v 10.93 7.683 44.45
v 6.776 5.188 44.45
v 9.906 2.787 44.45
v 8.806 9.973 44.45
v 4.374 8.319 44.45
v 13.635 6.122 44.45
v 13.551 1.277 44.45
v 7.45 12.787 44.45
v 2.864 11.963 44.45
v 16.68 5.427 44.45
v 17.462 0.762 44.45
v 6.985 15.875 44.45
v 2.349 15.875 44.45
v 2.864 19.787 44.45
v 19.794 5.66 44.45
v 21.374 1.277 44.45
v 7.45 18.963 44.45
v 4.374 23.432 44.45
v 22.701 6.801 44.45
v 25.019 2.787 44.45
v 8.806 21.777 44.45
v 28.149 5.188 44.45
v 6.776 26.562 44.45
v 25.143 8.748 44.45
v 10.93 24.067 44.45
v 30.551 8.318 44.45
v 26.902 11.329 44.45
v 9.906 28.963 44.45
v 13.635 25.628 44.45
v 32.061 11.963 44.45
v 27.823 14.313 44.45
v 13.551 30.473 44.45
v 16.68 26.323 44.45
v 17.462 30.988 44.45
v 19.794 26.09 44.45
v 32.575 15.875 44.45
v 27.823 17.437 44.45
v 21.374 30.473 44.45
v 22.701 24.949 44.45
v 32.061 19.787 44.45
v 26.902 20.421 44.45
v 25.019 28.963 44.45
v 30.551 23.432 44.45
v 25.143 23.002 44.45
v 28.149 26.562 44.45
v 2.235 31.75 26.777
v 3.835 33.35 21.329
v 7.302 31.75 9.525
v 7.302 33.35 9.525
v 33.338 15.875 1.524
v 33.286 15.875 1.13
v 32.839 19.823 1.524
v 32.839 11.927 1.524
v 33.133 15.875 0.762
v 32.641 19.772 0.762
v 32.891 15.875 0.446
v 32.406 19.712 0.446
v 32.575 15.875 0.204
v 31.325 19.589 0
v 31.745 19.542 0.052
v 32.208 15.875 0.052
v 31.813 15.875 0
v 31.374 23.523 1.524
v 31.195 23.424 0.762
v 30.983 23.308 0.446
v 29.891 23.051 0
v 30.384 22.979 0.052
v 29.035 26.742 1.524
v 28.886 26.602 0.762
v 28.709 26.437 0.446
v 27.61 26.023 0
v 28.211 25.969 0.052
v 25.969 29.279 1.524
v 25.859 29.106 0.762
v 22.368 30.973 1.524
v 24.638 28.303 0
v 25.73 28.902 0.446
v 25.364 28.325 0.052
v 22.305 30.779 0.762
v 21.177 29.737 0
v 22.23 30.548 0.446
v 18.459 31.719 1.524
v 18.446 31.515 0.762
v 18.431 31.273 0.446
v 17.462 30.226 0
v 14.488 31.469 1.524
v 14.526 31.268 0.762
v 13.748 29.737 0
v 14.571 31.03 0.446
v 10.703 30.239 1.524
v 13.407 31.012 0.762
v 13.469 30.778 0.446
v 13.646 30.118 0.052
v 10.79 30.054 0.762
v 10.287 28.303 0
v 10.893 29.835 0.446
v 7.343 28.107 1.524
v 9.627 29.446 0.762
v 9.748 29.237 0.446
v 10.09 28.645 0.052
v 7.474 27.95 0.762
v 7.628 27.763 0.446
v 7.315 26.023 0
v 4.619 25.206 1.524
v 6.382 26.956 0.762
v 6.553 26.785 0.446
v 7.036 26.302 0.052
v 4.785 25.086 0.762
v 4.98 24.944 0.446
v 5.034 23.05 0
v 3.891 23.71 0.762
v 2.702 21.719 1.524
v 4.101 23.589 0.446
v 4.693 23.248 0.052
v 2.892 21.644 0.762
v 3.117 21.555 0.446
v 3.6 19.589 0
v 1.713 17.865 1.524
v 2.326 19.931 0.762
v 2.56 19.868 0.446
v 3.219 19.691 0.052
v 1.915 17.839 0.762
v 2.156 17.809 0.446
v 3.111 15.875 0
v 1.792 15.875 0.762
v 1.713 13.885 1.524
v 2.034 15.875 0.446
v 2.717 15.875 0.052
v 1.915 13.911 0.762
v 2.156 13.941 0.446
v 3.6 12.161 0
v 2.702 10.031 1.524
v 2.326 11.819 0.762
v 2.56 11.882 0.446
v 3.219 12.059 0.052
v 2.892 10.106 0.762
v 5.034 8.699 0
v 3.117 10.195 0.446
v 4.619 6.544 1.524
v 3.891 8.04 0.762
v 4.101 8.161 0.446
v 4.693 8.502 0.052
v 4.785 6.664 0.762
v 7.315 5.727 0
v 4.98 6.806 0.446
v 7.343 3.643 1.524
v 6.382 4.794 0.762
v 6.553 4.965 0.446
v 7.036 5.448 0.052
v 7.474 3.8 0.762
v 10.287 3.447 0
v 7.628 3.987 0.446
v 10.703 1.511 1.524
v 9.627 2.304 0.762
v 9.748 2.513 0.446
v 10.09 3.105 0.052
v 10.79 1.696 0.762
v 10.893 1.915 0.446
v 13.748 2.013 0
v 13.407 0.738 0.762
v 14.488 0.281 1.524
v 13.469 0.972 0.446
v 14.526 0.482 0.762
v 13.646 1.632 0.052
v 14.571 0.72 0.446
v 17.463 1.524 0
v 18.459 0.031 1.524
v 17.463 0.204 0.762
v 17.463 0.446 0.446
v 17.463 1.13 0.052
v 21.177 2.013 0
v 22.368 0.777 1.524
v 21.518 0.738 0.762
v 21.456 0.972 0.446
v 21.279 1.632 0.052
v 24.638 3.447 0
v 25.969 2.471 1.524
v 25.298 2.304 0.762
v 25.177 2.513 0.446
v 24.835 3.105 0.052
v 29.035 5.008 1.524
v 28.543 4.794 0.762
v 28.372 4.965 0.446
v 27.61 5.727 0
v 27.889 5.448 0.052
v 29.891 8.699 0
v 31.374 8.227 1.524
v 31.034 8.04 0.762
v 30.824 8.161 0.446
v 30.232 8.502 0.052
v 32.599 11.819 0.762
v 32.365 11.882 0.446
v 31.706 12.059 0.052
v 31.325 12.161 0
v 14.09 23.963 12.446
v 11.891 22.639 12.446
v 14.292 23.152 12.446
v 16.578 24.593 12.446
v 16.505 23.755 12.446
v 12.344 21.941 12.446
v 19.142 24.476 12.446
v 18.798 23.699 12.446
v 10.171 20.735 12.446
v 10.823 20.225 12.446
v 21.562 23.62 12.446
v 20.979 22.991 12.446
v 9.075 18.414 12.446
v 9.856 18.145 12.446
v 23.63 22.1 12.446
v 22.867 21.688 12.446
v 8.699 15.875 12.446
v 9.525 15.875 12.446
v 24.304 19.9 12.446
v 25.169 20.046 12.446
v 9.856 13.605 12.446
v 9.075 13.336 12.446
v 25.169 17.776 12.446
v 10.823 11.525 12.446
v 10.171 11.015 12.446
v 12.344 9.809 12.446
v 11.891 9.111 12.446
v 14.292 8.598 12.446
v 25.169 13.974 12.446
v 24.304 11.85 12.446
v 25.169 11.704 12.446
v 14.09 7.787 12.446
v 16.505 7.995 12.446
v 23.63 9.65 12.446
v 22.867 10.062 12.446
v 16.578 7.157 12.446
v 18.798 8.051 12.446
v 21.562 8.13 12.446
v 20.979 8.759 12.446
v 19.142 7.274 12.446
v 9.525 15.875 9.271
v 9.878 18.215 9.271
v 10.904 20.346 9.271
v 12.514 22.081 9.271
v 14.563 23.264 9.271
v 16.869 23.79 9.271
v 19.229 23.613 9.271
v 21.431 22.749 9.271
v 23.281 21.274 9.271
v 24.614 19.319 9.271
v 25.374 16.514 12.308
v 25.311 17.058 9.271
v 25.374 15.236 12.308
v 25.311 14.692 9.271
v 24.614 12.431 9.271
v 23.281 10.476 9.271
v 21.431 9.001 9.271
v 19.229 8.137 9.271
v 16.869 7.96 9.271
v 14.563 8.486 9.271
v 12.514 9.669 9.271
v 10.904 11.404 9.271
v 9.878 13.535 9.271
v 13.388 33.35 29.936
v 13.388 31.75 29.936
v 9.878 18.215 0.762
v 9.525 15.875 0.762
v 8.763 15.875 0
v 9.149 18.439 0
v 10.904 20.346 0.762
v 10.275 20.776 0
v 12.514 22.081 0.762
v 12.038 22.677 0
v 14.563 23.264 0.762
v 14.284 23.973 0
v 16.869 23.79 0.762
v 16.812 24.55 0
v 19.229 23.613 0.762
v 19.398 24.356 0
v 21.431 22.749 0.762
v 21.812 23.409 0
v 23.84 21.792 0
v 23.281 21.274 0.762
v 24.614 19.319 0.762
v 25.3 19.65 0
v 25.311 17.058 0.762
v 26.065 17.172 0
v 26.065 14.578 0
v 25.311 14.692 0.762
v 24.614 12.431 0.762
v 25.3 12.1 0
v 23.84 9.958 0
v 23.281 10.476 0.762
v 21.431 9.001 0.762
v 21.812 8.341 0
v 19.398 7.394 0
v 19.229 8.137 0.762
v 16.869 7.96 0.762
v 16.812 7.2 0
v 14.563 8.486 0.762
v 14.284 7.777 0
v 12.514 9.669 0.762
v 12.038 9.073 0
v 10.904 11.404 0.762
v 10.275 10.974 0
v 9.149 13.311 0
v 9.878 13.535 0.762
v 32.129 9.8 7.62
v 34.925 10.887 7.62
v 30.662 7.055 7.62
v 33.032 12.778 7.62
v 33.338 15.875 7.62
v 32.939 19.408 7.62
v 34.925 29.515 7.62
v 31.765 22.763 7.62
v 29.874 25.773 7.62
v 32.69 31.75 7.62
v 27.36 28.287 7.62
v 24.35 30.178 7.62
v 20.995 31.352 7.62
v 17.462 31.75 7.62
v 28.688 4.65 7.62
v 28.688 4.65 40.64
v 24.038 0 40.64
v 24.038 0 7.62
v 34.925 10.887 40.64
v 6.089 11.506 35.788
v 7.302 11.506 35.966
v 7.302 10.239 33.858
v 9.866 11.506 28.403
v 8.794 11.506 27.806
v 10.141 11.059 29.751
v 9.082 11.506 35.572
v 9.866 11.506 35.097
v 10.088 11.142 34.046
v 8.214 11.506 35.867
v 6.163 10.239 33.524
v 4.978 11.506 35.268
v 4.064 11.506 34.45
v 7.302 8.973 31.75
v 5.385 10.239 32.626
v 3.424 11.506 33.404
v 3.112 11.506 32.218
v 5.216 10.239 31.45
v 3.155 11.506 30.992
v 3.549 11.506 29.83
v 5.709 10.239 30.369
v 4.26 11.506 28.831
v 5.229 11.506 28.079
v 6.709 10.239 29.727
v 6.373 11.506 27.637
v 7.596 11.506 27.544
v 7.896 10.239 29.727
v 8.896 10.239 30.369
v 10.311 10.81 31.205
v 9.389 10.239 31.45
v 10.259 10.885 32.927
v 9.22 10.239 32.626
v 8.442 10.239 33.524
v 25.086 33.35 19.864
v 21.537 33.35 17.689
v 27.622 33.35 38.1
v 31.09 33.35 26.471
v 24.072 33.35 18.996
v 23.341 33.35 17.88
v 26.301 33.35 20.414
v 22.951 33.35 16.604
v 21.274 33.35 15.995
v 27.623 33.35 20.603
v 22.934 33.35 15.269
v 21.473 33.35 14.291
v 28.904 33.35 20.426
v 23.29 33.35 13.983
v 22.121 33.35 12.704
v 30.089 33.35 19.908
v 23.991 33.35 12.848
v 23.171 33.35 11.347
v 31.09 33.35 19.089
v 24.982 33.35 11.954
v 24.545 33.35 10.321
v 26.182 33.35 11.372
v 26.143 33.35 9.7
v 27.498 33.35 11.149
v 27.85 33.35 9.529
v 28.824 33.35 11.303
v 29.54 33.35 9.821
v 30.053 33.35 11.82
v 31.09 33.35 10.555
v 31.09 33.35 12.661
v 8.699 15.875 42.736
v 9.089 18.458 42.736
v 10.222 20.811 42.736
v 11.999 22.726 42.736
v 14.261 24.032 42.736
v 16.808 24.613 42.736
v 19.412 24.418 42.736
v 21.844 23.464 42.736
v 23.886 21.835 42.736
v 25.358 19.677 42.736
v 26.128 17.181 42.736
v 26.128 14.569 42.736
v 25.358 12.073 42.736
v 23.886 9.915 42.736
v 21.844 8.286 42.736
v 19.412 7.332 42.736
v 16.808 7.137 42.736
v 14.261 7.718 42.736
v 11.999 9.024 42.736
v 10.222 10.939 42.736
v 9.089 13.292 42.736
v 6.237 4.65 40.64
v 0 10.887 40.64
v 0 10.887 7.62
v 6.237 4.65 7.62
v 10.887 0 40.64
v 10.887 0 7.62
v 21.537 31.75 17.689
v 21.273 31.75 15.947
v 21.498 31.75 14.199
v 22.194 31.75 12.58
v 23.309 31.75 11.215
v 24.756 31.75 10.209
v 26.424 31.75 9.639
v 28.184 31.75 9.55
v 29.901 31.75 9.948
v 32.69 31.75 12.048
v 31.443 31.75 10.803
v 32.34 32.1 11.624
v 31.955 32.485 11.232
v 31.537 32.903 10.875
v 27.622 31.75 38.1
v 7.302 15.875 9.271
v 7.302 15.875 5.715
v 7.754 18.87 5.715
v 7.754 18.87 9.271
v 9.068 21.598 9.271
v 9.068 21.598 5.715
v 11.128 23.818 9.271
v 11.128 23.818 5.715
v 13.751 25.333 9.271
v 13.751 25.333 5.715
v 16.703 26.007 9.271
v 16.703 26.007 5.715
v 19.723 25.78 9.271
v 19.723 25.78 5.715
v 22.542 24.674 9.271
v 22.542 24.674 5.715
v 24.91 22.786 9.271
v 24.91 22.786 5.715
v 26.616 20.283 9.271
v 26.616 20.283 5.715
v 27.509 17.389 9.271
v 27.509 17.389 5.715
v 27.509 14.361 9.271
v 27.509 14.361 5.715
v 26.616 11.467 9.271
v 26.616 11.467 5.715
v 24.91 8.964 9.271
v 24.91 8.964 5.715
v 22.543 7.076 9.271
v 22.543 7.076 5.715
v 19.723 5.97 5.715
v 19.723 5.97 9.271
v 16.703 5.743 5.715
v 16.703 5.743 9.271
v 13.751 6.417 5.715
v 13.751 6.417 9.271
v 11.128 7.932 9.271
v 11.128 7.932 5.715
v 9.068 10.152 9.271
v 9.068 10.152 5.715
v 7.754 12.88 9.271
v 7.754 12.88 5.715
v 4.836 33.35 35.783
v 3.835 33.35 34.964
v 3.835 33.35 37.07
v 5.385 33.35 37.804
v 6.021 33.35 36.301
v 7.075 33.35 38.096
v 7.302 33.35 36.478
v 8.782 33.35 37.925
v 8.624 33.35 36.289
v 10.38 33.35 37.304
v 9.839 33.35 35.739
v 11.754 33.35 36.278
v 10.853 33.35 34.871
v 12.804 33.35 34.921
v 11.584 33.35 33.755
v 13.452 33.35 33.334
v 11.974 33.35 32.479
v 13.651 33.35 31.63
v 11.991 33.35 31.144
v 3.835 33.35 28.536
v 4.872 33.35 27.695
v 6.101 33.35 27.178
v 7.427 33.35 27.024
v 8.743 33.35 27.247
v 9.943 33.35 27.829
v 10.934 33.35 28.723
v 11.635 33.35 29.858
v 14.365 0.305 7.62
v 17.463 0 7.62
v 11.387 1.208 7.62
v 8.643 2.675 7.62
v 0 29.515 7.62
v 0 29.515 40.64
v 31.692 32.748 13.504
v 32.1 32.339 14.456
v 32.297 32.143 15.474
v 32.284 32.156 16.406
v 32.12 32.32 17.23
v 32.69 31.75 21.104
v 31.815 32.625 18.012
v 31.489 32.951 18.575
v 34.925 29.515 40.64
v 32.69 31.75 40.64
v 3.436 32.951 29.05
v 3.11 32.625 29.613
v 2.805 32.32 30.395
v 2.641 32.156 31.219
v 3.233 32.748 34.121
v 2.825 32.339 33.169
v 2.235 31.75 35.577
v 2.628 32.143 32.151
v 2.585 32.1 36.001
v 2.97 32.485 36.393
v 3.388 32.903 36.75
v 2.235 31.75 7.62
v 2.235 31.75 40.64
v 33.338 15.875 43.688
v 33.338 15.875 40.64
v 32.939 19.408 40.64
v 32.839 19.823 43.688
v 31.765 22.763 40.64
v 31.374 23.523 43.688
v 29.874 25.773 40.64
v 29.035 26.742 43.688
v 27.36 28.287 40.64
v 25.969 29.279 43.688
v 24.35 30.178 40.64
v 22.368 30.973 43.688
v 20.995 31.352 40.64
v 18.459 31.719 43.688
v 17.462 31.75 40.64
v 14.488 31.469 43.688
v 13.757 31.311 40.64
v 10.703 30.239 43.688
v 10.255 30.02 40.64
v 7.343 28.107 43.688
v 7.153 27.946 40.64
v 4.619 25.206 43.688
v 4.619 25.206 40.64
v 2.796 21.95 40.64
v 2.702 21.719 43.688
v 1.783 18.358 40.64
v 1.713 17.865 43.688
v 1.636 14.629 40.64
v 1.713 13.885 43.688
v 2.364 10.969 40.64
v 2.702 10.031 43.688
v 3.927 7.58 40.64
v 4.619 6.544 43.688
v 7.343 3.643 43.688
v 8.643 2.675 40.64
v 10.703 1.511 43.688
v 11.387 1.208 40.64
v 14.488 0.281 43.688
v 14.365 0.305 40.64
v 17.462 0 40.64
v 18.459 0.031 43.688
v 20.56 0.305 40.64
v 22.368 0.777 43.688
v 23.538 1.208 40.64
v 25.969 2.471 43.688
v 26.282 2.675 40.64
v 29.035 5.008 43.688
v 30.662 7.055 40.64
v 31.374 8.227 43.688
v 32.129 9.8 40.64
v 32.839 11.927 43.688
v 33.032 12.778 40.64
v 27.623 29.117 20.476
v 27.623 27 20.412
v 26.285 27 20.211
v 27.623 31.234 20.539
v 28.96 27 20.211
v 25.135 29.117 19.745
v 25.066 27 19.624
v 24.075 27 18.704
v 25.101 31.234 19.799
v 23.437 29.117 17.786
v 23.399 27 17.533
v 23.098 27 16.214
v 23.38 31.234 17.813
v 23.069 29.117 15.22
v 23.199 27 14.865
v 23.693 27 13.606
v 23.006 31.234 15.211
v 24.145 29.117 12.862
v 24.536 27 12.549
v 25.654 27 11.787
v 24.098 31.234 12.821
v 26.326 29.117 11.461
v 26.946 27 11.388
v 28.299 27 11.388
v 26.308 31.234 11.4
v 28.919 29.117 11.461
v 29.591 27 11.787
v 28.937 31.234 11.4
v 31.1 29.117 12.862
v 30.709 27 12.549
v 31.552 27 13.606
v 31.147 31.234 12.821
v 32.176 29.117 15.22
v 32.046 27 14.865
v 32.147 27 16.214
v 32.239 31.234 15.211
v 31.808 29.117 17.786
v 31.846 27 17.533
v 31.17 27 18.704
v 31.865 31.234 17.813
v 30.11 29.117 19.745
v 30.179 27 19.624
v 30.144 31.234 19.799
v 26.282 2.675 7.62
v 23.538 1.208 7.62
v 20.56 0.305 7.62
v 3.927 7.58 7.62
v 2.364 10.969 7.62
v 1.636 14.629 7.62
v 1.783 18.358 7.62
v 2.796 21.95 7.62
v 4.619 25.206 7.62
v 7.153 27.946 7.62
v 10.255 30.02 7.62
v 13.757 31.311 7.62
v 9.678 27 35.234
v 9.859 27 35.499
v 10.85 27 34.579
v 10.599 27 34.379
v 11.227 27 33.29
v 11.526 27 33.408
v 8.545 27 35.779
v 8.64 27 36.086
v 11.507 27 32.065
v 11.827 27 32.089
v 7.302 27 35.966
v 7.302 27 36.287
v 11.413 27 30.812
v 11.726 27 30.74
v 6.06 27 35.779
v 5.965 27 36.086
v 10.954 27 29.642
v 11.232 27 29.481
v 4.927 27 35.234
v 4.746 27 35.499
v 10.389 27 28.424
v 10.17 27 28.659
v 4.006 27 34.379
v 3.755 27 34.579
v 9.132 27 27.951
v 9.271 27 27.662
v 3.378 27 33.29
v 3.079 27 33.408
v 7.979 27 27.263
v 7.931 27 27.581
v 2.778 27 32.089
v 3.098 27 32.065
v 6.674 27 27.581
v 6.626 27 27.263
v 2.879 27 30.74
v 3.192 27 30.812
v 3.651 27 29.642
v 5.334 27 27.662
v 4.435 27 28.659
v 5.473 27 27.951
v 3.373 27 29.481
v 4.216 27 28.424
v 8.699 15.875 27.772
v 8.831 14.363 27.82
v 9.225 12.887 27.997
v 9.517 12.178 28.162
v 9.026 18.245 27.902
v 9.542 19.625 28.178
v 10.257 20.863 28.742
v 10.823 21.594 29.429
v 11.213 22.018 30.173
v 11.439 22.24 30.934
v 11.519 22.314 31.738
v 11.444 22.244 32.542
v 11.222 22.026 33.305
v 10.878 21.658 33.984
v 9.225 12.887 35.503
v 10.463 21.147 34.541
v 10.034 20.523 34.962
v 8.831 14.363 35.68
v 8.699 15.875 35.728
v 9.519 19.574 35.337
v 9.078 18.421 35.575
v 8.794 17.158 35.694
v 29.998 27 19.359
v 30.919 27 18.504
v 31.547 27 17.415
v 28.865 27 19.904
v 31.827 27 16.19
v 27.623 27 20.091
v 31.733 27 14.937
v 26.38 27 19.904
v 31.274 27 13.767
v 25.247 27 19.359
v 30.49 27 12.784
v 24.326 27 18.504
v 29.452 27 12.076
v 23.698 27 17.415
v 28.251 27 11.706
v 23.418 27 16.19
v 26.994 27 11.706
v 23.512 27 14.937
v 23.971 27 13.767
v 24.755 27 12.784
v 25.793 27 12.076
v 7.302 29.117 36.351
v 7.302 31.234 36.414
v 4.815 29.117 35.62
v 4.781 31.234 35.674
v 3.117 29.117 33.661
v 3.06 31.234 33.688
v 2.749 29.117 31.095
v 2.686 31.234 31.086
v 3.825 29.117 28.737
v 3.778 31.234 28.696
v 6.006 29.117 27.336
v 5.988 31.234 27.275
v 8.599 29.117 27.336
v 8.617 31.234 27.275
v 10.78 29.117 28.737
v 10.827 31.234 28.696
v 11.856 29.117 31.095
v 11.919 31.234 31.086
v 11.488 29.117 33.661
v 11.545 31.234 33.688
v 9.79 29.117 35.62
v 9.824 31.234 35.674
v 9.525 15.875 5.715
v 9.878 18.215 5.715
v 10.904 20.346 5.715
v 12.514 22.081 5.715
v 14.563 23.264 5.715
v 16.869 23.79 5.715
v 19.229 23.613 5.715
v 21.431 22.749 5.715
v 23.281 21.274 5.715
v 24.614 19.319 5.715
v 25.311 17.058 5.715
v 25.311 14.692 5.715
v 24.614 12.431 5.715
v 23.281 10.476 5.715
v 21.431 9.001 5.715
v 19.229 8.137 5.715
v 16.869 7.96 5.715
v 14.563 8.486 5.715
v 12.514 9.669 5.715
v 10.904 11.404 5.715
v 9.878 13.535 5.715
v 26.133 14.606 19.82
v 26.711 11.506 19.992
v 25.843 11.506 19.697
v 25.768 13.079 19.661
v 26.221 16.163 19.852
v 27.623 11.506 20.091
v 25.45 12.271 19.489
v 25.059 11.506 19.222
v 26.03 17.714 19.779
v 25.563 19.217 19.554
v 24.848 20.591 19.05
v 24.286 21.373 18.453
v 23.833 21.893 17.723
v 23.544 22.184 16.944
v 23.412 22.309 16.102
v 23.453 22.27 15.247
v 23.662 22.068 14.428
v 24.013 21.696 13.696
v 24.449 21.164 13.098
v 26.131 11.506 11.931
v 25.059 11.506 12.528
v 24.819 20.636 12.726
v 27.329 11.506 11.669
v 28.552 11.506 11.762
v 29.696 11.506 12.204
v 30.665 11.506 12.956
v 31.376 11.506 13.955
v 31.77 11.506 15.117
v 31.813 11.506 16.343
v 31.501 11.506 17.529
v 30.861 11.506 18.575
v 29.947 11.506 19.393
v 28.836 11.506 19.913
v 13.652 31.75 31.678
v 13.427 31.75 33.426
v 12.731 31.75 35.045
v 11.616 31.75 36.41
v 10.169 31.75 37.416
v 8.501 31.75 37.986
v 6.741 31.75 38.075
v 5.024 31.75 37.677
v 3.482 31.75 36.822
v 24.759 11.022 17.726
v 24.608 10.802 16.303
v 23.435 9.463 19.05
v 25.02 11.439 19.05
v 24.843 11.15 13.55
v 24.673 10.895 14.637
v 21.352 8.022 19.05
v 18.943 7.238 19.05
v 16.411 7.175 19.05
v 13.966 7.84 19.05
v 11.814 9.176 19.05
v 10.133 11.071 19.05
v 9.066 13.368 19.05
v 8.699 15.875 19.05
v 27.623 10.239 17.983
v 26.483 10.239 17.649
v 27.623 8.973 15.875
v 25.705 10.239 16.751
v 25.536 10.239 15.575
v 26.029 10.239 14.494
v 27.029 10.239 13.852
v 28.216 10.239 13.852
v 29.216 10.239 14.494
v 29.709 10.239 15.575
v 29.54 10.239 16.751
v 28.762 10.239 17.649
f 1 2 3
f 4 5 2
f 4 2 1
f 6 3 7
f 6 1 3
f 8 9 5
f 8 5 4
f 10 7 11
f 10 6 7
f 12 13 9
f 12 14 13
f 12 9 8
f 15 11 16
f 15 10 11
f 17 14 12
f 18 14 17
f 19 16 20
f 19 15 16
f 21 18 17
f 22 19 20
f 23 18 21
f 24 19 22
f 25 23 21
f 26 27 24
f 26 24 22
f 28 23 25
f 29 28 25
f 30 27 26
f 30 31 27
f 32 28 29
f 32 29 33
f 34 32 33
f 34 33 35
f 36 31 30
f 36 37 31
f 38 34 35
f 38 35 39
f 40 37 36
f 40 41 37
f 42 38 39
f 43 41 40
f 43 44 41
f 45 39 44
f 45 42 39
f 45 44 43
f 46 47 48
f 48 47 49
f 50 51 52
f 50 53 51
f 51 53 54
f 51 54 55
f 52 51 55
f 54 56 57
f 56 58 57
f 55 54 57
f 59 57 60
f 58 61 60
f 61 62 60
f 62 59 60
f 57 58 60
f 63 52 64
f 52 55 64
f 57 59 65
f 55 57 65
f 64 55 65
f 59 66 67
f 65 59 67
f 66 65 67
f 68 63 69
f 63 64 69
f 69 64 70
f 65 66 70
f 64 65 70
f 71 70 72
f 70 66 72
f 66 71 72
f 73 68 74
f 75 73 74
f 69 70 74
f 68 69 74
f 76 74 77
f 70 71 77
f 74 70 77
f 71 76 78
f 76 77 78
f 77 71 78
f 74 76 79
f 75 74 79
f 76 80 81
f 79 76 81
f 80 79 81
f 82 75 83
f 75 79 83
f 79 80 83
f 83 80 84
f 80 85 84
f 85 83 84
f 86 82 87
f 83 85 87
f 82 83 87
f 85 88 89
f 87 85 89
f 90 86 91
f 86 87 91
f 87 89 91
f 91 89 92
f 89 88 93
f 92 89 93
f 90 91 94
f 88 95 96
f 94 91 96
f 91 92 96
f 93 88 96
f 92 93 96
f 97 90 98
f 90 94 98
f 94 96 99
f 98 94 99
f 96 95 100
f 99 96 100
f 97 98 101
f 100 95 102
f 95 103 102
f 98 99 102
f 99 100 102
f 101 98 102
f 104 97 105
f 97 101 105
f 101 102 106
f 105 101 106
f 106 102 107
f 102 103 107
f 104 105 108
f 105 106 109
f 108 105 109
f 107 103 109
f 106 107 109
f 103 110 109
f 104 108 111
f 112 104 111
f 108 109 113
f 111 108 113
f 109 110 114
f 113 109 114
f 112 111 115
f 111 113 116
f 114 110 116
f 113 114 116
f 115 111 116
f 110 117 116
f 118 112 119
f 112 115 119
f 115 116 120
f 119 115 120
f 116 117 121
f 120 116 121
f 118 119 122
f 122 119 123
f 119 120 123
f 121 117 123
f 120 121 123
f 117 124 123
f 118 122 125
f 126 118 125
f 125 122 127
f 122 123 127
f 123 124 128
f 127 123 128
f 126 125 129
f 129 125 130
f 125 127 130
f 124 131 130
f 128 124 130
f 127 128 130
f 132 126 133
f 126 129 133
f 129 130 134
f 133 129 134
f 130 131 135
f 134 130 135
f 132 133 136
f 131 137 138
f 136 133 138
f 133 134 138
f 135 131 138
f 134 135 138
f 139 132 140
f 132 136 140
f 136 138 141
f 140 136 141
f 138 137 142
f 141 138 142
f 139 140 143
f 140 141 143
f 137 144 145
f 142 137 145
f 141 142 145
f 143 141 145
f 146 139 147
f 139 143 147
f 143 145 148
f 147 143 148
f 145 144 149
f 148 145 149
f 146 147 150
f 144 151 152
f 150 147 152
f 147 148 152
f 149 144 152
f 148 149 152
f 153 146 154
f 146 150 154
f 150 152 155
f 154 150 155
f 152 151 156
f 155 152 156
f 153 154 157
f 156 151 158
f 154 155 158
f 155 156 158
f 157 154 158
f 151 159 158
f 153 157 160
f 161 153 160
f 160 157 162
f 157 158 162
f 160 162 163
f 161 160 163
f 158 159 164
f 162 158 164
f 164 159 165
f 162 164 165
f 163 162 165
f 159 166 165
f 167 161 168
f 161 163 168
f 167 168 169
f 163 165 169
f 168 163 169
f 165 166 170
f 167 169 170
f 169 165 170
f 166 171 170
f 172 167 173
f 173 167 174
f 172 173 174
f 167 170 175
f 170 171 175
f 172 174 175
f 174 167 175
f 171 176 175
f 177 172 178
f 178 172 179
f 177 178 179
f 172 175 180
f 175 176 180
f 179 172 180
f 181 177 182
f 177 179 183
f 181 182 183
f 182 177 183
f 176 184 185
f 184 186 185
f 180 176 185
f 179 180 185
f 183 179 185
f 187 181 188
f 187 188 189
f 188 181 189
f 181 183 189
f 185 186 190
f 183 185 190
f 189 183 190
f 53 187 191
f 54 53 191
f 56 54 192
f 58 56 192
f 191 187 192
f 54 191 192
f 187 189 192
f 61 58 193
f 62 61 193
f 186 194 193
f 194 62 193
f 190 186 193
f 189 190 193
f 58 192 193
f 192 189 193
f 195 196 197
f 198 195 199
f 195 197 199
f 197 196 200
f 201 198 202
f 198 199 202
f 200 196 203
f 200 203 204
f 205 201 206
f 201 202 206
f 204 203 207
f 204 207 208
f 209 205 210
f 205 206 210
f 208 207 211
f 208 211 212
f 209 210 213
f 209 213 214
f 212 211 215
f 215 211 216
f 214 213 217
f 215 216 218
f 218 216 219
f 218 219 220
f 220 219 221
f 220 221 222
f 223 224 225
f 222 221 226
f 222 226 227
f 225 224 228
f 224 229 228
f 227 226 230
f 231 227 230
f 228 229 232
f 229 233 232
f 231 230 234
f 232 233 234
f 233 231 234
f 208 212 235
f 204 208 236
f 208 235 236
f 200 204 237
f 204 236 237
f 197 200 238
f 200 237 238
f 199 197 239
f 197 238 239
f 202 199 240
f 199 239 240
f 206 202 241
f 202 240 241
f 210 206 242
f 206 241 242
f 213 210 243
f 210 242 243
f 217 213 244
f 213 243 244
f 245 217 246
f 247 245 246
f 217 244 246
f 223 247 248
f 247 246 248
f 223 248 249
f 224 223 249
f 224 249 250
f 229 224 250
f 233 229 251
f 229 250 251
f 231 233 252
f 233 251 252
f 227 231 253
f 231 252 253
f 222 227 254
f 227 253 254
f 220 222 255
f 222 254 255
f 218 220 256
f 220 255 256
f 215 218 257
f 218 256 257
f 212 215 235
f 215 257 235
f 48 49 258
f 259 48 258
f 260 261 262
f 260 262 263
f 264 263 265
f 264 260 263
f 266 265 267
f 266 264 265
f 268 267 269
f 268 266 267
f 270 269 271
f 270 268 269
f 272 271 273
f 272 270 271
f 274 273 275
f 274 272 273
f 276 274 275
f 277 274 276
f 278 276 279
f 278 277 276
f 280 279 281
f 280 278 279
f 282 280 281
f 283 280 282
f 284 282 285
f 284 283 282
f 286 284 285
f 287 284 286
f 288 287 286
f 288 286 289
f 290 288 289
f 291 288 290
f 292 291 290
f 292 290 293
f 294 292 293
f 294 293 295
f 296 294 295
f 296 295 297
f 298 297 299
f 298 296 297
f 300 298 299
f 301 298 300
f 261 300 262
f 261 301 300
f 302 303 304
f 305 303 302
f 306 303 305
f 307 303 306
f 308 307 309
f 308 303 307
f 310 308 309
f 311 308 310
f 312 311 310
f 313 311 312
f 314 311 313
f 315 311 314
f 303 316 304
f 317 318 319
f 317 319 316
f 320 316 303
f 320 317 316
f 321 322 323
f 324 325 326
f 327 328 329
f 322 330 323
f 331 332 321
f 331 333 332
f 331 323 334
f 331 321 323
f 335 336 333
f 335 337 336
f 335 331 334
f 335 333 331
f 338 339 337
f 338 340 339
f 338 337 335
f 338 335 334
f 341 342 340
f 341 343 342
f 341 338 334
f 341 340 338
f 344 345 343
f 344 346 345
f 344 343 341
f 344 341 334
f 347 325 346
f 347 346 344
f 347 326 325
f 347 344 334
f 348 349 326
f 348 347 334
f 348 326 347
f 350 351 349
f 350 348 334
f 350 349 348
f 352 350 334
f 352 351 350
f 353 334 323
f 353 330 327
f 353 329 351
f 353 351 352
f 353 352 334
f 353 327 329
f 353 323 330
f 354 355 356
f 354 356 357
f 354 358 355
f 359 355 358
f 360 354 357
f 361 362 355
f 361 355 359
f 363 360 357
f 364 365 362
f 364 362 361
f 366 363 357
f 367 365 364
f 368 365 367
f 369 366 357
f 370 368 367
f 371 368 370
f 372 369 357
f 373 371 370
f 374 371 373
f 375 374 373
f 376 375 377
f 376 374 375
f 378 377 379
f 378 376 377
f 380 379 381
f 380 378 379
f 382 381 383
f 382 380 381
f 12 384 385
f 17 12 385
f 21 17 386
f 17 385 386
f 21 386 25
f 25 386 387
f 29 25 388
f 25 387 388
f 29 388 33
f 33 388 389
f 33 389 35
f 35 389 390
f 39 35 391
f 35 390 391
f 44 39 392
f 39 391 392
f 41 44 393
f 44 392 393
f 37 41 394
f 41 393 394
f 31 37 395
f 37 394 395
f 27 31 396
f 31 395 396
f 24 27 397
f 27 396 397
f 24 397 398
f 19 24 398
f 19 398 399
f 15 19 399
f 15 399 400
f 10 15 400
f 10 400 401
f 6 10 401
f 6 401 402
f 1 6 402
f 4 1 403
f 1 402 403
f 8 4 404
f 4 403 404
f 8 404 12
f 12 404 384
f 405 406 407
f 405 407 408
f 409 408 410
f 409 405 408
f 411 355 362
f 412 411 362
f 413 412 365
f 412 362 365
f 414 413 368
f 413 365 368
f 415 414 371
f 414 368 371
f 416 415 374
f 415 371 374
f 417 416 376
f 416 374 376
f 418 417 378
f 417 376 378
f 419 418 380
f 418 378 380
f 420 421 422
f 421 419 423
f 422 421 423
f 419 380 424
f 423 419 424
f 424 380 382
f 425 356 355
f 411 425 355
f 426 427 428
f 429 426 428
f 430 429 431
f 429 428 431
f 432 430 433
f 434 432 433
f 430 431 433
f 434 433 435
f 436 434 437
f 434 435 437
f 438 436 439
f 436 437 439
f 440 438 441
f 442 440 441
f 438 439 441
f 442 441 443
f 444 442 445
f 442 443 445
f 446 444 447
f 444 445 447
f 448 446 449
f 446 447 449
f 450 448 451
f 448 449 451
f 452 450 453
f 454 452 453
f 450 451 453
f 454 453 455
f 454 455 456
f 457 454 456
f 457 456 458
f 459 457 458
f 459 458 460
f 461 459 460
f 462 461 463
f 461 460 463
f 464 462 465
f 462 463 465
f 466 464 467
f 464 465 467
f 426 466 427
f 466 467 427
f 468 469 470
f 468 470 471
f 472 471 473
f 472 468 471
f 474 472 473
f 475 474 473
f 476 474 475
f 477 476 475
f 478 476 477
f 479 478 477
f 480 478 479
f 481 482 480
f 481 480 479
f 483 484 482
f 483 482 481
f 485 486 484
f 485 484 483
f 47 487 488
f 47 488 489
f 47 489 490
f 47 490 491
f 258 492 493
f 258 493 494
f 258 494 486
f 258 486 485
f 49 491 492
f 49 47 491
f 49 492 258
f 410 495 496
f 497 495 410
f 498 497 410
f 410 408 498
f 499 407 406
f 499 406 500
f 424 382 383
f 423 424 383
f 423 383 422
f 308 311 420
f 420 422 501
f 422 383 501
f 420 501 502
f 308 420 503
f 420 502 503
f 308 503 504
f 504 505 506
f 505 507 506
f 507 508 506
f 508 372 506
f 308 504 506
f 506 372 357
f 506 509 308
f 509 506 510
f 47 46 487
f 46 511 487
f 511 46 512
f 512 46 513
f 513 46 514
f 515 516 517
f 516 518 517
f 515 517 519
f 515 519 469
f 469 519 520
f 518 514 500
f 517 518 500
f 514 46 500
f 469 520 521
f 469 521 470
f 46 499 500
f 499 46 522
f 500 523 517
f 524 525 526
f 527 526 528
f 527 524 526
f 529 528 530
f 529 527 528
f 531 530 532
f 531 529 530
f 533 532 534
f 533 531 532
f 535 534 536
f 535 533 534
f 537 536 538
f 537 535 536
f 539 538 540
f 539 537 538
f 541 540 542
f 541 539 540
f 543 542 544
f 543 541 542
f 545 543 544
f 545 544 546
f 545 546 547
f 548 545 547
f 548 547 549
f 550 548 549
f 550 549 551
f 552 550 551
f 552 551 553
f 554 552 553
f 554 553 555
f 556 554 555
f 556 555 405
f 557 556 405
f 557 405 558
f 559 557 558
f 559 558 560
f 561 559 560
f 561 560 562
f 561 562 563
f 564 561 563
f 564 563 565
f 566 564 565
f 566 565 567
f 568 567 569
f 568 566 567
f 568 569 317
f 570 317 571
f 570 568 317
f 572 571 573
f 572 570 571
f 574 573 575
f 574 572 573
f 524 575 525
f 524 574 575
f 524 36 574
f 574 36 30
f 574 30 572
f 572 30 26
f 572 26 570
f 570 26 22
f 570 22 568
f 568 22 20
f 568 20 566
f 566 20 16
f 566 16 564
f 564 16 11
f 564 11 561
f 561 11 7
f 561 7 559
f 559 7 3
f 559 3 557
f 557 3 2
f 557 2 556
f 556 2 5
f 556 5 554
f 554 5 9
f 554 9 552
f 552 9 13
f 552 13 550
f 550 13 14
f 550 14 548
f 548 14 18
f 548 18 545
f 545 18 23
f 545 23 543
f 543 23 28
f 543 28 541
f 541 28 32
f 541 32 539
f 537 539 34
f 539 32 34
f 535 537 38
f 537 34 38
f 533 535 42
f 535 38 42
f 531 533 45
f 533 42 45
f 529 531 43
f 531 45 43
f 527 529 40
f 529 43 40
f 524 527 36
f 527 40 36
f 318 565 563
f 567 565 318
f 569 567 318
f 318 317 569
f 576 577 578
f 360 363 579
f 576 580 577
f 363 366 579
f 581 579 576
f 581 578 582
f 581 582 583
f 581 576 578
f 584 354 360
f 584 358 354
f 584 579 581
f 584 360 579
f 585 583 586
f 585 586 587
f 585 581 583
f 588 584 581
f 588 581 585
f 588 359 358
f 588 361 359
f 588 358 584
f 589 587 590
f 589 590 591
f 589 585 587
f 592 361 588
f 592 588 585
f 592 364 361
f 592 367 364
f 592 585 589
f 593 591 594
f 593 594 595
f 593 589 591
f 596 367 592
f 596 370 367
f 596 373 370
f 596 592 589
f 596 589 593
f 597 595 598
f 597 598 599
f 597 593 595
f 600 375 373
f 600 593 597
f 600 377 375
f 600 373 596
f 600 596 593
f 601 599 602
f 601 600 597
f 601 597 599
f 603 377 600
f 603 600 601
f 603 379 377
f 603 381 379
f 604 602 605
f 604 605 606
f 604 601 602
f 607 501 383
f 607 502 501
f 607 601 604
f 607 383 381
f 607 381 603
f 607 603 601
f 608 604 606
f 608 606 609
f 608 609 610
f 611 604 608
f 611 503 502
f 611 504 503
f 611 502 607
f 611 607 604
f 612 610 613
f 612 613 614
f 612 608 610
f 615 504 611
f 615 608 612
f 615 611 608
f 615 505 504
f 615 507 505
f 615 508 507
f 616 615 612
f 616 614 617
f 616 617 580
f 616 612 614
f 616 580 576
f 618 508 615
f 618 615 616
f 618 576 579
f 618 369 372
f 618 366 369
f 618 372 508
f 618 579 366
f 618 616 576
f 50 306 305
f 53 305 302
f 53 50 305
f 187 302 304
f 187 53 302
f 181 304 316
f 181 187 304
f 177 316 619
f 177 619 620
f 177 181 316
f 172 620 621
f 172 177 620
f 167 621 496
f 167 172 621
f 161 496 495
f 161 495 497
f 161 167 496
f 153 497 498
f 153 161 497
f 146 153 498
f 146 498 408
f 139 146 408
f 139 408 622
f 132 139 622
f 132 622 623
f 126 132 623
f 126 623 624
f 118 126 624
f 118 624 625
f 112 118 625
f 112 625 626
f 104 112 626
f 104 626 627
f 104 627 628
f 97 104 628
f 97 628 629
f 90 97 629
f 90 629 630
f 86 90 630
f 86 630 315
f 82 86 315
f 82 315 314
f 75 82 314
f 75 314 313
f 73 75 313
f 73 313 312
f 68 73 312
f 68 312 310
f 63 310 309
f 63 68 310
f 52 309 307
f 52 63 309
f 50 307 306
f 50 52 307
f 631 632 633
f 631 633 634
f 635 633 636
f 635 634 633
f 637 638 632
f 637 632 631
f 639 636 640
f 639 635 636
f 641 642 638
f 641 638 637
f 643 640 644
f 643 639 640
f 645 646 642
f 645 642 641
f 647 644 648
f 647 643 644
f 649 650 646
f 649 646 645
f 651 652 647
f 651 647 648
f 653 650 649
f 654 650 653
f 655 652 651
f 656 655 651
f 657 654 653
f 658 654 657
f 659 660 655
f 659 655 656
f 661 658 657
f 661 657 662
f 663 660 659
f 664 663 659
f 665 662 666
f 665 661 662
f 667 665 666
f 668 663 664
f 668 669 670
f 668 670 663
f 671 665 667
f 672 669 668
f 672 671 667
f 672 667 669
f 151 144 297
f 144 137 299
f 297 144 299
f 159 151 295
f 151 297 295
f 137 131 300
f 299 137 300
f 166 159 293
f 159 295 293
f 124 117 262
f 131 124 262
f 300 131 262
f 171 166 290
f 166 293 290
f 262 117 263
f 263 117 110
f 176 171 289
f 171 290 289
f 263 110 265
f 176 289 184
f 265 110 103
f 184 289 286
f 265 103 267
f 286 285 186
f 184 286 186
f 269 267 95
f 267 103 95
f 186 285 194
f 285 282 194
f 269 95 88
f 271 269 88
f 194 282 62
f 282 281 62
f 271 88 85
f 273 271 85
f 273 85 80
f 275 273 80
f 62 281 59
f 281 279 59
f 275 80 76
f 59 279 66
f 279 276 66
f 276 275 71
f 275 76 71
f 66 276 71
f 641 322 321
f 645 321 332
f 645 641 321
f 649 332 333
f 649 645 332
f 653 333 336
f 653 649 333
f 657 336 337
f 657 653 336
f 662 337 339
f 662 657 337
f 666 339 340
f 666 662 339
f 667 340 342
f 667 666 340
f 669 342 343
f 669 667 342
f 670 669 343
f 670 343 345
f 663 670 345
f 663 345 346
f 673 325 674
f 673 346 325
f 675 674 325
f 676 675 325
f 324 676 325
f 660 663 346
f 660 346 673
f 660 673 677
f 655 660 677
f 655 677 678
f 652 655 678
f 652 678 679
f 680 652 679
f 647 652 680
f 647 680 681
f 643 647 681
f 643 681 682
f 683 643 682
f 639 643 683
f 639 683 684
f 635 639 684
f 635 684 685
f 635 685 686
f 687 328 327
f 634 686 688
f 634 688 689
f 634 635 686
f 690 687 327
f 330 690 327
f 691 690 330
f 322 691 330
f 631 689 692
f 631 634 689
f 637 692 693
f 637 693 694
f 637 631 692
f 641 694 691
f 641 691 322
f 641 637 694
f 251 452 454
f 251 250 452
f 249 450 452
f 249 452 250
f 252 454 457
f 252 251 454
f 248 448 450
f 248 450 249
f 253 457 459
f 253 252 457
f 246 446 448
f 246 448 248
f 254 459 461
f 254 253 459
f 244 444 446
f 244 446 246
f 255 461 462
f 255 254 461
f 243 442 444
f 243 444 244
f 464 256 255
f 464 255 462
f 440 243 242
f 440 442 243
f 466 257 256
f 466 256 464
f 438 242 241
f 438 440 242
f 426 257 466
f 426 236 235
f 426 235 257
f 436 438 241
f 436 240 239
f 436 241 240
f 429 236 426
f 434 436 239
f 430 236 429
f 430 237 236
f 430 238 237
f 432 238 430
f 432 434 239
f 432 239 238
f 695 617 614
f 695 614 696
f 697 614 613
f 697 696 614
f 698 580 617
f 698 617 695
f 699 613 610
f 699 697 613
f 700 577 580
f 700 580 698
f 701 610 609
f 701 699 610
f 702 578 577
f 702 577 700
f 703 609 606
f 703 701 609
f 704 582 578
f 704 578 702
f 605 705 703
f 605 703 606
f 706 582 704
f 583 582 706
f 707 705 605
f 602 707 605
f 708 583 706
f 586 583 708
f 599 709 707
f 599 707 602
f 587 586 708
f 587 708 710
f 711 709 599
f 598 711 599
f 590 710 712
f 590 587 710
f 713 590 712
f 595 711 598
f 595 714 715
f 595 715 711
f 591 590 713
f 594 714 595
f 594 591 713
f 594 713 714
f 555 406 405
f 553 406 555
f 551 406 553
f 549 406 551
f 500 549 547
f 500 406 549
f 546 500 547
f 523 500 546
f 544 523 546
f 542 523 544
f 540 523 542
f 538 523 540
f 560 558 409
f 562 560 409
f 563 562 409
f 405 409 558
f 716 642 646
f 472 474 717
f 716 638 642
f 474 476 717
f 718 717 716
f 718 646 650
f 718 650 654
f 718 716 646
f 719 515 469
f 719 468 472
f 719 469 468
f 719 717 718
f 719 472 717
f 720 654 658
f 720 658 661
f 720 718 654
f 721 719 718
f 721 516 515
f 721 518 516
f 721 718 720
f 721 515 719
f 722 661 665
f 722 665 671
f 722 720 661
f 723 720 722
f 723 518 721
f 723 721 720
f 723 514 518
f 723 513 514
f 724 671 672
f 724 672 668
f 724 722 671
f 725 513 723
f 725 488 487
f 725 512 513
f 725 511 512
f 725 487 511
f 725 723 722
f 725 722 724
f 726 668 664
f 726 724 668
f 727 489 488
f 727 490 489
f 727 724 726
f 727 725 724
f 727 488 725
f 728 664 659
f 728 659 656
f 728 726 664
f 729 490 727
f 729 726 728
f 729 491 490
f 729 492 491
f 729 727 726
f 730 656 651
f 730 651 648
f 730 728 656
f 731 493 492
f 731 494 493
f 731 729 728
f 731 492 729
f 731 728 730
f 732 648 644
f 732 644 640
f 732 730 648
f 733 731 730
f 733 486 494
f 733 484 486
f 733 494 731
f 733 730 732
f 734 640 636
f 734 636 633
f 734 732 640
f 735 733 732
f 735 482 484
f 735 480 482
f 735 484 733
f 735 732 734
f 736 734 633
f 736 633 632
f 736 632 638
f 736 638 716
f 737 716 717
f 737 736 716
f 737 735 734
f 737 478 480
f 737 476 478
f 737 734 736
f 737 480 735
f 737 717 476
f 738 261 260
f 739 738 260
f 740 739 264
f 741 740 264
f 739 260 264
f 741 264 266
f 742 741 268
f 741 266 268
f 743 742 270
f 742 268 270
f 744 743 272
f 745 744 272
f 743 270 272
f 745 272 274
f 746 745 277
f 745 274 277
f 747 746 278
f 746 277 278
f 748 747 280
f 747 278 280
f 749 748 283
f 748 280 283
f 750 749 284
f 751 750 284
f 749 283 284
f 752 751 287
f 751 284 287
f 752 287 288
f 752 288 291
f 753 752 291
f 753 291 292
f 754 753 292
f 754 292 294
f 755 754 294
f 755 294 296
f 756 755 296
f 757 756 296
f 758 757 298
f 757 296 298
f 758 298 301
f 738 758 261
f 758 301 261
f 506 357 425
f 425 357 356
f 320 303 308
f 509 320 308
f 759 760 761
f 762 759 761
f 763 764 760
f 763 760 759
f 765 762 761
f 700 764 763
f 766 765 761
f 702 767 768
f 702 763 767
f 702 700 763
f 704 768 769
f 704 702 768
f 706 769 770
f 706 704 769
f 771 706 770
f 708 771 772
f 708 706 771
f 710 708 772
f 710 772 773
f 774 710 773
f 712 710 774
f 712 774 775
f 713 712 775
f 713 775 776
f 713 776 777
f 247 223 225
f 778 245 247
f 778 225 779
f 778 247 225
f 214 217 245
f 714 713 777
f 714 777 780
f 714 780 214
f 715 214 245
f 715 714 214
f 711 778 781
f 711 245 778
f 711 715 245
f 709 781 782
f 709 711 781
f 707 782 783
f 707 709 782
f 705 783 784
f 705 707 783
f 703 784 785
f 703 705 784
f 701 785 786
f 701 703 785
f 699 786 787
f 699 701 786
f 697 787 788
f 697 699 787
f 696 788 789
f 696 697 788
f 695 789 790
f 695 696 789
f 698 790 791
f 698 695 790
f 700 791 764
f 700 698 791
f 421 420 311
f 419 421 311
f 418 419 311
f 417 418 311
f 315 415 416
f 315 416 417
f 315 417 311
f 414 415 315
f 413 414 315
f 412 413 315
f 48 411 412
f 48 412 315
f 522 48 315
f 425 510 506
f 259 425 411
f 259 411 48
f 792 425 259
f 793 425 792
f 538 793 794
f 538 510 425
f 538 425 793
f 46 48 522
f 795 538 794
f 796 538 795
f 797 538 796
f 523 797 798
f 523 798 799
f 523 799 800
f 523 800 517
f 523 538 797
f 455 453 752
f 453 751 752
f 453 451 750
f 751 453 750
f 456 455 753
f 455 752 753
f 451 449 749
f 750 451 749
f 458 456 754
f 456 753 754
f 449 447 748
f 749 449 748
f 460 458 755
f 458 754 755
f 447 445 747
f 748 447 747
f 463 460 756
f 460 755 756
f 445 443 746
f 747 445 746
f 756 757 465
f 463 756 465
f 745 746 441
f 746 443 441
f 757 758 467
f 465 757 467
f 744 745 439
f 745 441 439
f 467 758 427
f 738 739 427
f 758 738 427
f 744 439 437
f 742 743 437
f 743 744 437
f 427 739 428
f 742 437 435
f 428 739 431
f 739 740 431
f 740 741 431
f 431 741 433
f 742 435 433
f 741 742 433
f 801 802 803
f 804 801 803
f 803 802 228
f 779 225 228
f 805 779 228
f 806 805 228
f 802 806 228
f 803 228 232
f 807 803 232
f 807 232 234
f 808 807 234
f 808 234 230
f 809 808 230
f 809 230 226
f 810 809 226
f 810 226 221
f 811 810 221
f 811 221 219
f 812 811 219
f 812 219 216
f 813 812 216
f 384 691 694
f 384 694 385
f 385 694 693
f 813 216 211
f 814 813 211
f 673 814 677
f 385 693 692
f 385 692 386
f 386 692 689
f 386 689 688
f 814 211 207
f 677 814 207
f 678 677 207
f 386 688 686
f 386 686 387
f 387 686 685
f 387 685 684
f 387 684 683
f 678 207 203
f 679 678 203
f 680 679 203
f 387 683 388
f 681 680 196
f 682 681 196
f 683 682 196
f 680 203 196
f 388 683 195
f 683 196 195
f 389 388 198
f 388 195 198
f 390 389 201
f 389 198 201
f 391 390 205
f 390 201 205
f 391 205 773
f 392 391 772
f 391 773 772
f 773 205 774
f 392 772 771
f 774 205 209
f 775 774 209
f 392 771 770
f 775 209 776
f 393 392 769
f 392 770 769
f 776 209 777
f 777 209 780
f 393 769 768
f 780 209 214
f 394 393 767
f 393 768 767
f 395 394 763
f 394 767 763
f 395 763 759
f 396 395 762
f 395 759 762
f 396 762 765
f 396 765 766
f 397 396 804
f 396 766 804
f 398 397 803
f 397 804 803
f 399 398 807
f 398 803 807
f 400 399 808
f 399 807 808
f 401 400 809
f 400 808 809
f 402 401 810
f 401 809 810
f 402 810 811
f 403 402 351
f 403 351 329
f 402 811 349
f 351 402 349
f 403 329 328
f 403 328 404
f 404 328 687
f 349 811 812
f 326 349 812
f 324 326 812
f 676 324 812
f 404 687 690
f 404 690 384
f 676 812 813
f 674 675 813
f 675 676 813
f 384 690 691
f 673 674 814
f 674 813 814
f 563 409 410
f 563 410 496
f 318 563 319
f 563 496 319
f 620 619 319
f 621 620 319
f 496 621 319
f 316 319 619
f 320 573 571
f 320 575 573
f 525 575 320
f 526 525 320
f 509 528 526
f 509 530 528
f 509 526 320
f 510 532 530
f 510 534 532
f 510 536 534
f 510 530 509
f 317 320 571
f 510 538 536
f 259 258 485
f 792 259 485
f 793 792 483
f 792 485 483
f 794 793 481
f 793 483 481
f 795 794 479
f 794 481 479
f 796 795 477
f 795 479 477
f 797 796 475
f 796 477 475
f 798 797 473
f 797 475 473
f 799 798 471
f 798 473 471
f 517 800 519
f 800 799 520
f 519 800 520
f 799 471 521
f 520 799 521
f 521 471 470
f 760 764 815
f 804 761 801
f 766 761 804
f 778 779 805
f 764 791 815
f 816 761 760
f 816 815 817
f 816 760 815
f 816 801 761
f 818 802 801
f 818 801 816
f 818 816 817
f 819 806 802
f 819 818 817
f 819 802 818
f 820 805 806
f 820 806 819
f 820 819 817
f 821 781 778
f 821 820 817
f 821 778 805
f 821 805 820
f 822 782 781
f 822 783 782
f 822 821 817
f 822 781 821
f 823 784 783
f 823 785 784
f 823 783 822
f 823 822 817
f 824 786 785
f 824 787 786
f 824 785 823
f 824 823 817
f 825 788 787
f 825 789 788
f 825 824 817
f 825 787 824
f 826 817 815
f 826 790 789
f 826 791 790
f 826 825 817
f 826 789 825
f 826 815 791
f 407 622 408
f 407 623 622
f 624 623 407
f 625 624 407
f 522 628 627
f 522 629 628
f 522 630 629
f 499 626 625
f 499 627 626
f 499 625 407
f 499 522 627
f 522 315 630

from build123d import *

# Parameters (mm, degrees)
SKETCH1_W                         = 34.925
SKETCH1_H                         = 33.3502
EXTRUDE1_DEPTH                    = 44.45
CUT_EXTRUDE1_DEPTH                = 44.45
SKETCH3_OUTSIDE_W                 = 50.051
SKETCH3_OUTSIDE_H                 = 48.476
SKETCH3_OUTSIDE_R                 = 15.875
CUT_EXTRUDE2_DEPTH                = 3.81
F_1_8_NPT_TAPPED_HOLE1_AT_2_COUNT = 2
F_1_8_NPT_TAPPED_HOLE1_AT_2_PITCH = 25.78600444
SKETCH5_OUTSIDE_W                 = 50.051
SKETCH5_OUTSIDE_H                 = 48.476
SKETCH5_OUTSIDE_R                 = 15.875
CUT_EXTRUDE3_DEPTH                = 7.62
SKETCH6_W                         = 34.925
SKETCH6_H                         = 33.02
CUT_EXTRUDE4_DEPTH                = 1.6002
CUT_EXTRUDE5_DEPTH                = 45.45
F_5_8_0_625_DIAMETER_HOLE1_D      = 15.875
F_3_4_16_TAPPED_HOLE1_D           = 17.526
F_3_4_16_TAPPED_HOLE1_DEPTH       = 25.4
F_3_4_16_TAPPED_HOLE1_TIP         = 5.265341605
SKETCH16_R                        = 10.16
CUT_EXTRUDE7_DEPTH                = 3.556
CHAMFER1_SIZE                     = 0.762
FILLET1_R                         = 1.524
CHAMFER2_SIZE                     = 1.7145
SKETCH18_R                        = 8.763
CUT_EXTRUDE9_DEPTH                = 7.62


with BuildPart() as part:
    # Sketch1 → Extrude1 (new body)
    with BuildSketch(Plane.XY):
        with Locations((17.4625, 16.6751)):
            Rectangle(SKETCH1_W, SKETCH1_H)
    extrude(amount=EXTRUDE1_DEPTH)

    # Sketch2 → Cut-Extrude1 (cut)
    with BuildSketch(Plane.XY.offset(44.45)):
        Polygon((24.038140303, 0), (34.925, 10.886859697), (38.95323648, 7.676224118), (37.650767603, -4.874839611), (-1.660111248, -5.999699096), (-2.784970733, 8.327458557), (0, 10.886859697), (10.886859697, 0), (18.528156354, -3.690776995), align=None)
    extrude(amount=-CUT_EXTRUDE1_DEPTH, mode=Mode.SUBTRACT)

    # Sketch3 outside → Cut-Extrude2 (cut)
    with BuildSketch(Plane.XY.offset(44.45)):
        with Locations((17.4625, 16.675)):
            Rectangle(SKETCH3_OUTSIDE_W, SKETCH3_OUTSIDE_H)
        with Locations((17.4625, 15.875)):
            Circle(SKETCH3_OUTSIDE_R, mode=Mode.SUBTRACT)
    extrude(amount=-CUT_EXTRUDE2_DEPTH, mode=Mode.SUBTRACT)

    # Sketch4 → 1/8 NPT Tapped Hole1 (revolve, cut)
    with BuildSketch(Plane(origin=(7.3025, 33.3502, 31.75), x_dir=(0, 0, 1), z_dir=(1, 0, 0))):
        Polygon((0, 0), (0, 24.377468714), (4.2164, 21.844), (4.2164, 6.35), (4.537409396, 6.35), (4.7275369, 0), align=None)
    f_1_8_npt_tapped_hole1 = revolve(axis=Axis((7.3025, 39.7002, 31.75), (0, -1, 0)), mode=Mode.SUBTRACT)

    # 1/8 NPT Tapped Hole1 at 2: 1/8 NPT Tapped Hole1 ×2
    with Locations(*[Vector(0.788024374, 0, -0.615644042) * (i * F_1_8_NPT_TAPPED_HOLE1_AT_2_PITCH) for i in range(1, F_1_8_NPT_TAPPED_HOLE1_AT_2_COUNT)]):
        add(f_1_8_npt_tapped_hole1, mode=Mode.SUBTRACT)

    # Sketch5 outside → Cut-Extrude3 (cut)
    with BuildSketch(Plane(origin=(0, 0, 0), x_dir=(-1, 0, 0), z_dir=(0, 0, -1))):
        with Locations((-17.4625, 16.675)):
            Rectangle(SKETCH5_OUTSIDE_W, SKETCH5_OUTSIDE_H)
        with Locations(Location((-17.4625, 15.875, 0), (0, 0, 180))):  # turned: the seam where the file's is
            Circle(SKETCH5_OUTSIDE_R, mode=Mode.SUBTRACT)
    extrude(amount=-CUT_EXTRUDE3_DEPTH, mode=Mode.SUBTRACT)

    # Sketch6 → Cut-Extrude4 (cut)
    with BuildSketch(Plane(origin=(0, 33.3502, 0), x_dir=(-1, 0, 0), z_dir=(0, 1, 0))):
        with Locations((-17.4625, 24.13)):
            Rectangle(SKETCH6_W, SKETCH6_H)
        with BuildLine():
            Line((-33.707799282, 17.689285714), (-27.6225, 38.1))
            Line((-27.6225, 38.1), (-21.537200718, 17.689285714))
            ThreePointArc((-21.537200718, 17.689285714), (-27.6225, 9.525), (-33.707799282, 17.689285714))
        make_face(mode=Mode.SUBTRACT)
        with BuildLine():
            Line((-7.3025, 9.525), (-13.387799282, 29.935714286))
            ThreePointArc((-13.387799282, 29.935714286), (-7.839432762, 38.077258744), (-0.998497845, 30.98707351))
            ThreePointArc((-0.998497845, 30.98707351), (-1.209886072, 29.96043147), (-1.587281519, 28.982550324))
            Line((-1.587281519, 28.982550324), (-7.3025, 9.525))
        make_face(mode=Mode.SUBTRACT)
    extrude(amount=-CUT_EXTRUDE4_DEPTH, mode=Mode.SUBTRACT)

    # Sketch8 → Cut-Extrude5 (cut, through all)
    with BuildSketch(Plane.XY.offset(44.45)):
        Polygon((0, 29.5148), (8.827956785, 38.342756785), (29.988545511, 34.451254489), (34.925, 29.5148), (37.769173864, 38.094844764), (-2.725767603, 41.455222953), (-4.620267788, 29.436987401), align=None)
    extrude(amount=-CUT_EXTRUDE5_DEPTH, mode=Mode.SUBTRACT)

    # 5/8 (0.625) Diameter Hole1 (through all)
    with Locations(Plane(origin=(17.4625, 15.875, 44.45), x_dir=(1, 0, 0), z_dir=(0, 0, 1))):
        with Locations((0, 0)):
            Hole(F_5_8_0_625_DIAMETER_HOLE1_D / 2)

    # 3/4-16 Tapped Hole1
    with Locations(Plane(origin=(17.4625, 15.875, 44.45), x_dir=(1, 0, 0), z_dir=(0, 0, 1))):
        with Locations((0, 0)):
            Hole(F_3_4_16_TAPPED_HOLE1_D / 2, depth=F_3_4_16_TAPPED_HOLE1_DEPTH)
            with Locations((0, 0, -(F_3_4_16_TAPPED_HOLE1_DEPTH + F_3_4_16_TAPPED_HOLE1_TIP / 2))):  # 118° drill point
                Cone(0, F_3_4_16_TAPPED_HOLE1_D / 2, F_3_4_16_TAPPED_HOLE1_TIP, mode=Mode.SUBTRACT)

    # Sketch16 → Cut-Extrude7 (cut)
    with BuildSketch(Plane(origin=(0, 0, 5.715), x_dir=(-1, 0, 0), z_dir=(0, 0, -1))):
        with Locations((-17.4625, 15.875)):
            Circle(SKETCH16_R)
    extrude(amount=-CUT_EXTRUDE7_DEPTH, mode=Mode.SUBTRACT)

    # Chamfer1
    chamfer1_edges = [part.edges().sort_by_distance(p)[0] for p in [
        (25.4, 15.875, 0),
        (1.5875, 15.875, 44.45),
    ]]
    chamfer(chamfer1_edges, length=CHAMFER1_SIZE)

    # Fillet1
    fillet1_edges = [part.edges().sort_by_distance(p)[0] for p in [
        (1.5875, 15.875, 0),
    ]]
    fillet(fillet1_edges, radius=FILLET1_R)

    # Chamfer2
    chamfer2_edges = [part.edges().sort_by_distance(p)[0] for p in [
        (26.2255, 15.875, 44.45),
    ]]
    chamfer(chamfer2_edges, length=CHAMFER2_SIZE)

    # Sketch18 → Cut-Extrude9 (cut)
    with BuildSketch(Plane(origin=(0, 0, 12.446), x_dir=(-1, 0, 0), z_dir=(0, 0, -1))):
        with Locations(Location((-17.4625, 15.875, 0), (0, 0, 208.426476552))):  # turned: the seam where the file's is
            Circle(SKETCH18_R)
    extrude(amount=-CUT_EXTRUDE9_DEPTH, mode=Mode.SUBTRACT)


solid = part.part
